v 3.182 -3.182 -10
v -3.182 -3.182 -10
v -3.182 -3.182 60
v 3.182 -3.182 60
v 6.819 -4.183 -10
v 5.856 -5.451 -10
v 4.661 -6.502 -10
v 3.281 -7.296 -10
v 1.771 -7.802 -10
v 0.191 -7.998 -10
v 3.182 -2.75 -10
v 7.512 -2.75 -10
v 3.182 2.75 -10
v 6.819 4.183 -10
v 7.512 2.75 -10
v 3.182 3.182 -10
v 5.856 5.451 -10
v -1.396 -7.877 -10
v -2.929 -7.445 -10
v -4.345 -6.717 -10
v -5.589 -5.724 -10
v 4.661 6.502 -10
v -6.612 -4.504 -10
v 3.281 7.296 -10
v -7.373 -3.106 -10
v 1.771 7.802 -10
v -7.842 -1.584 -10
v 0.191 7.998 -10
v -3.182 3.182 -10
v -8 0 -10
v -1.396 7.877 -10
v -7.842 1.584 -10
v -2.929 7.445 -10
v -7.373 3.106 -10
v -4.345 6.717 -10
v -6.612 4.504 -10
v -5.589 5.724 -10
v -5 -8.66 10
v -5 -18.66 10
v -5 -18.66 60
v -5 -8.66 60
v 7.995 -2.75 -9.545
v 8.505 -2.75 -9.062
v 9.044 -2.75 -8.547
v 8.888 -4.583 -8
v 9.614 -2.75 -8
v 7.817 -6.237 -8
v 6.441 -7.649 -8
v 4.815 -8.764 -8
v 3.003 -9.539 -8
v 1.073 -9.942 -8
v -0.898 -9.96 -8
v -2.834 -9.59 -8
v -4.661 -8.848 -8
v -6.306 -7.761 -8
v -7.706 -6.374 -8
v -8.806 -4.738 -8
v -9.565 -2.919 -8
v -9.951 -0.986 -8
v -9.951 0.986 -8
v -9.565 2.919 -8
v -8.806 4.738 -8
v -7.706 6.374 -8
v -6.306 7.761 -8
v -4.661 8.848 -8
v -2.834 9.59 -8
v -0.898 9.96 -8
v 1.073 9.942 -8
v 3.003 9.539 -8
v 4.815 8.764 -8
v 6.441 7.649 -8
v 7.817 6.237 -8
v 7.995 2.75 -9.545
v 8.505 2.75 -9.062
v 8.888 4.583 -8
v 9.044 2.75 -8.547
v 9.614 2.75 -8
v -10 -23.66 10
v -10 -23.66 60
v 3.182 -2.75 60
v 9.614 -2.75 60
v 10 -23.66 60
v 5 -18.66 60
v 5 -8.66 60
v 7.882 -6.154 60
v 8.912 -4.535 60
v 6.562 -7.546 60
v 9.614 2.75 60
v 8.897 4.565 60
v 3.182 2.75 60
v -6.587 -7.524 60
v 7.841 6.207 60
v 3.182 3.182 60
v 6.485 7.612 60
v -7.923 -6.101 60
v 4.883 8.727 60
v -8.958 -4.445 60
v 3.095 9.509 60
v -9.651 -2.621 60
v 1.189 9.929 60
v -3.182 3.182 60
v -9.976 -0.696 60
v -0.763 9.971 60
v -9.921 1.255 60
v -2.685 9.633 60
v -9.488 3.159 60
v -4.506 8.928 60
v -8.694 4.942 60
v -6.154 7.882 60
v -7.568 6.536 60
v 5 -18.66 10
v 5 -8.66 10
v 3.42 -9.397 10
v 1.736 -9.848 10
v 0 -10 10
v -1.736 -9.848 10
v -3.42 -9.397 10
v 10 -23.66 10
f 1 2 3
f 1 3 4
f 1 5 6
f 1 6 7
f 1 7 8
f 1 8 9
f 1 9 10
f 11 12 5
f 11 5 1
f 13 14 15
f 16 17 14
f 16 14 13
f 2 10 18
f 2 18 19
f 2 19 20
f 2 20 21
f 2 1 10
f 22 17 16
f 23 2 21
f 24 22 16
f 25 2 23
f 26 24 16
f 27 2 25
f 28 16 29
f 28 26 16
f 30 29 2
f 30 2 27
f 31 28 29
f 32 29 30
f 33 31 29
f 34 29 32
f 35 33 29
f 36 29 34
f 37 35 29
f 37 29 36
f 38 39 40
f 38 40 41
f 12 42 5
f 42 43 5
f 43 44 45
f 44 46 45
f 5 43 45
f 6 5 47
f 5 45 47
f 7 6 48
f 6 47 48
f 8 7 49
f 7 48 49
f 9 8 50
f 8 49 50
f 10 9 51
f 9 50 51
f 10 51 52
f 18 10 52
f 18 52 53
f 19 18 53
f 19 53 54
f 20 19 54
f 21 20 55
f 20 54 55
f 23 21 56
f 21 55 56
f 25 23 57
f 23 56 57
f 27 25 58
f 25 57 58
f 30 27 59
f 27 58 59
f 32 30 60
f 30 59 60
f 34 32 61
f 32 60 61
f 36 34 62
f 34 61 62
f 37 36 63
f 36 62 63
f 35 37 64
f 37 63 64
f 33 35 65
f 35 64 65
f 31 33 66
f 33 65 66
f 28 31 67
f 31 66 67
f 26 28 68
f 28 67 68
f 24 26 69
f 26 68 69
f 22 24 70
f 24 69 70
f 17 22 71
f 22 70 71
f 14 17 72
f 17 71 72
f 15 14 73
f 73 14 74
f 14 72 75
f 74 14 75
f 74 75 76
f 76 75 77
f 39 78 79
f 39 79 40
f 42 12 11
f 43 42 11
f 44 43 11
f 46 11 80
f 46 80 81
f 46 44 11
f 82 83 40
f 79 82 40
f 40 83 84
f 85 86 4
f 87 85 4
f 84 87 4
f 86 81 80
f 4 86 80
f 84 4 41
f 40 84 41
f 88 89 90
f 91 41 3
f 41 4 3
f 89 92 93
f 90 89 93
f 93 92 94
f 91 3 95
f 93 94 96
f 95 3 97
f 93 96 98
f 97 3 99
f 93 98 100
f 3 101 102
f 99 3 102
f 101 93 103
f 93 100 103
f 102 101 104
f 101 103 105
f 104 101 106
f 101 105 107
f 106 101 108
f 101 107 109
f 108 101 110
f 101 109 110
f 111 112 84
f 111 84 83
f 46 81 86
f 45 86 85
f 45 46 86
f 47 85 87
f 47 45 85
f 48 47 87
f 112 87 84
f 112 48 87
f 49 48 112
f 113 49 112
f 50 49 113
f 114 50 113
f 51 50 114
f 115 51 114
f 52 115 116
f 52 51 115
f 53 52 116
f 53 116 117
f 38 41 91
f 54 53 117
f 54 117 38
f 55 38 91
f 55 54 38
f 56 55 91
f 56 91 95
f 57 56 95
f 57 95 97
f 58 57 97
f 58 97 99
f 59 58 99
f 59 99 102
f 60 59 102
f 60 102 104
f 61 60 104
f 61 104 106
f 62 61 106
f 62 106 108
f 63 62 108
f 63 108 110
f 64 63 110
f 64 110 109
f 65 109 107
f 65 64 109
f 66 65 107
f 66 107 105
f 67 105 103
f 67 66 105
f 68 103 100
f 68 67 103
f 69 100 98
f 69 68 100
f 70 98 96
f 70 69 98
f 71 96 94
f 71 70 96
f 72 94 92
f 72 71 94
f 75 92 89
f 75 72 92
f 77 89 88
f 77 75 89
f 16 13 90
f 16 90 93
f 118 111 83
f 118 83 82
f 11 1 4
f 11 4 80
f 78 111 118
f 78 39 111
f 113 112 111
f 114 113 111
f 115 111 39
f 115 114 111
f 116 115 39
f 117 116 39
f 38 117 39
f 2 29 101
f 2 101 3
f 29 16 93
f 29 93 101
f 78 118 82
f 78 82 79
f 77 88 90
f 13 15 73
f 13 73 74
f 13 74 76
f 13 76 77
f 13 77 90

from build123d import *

# Parameters (mm, degrees)
BOSS_EXTRU_1_DEPTH      = 60
BOSS_EXTRU_1_DEPTH_BACK = 10
BOSS_EXTRU_2_START      = -50
BOSS_EXTRU_2_DEPTH      = 50
CHANFREIN1_SIZE         = 2


with BuildPart() as part:
    # Esquisse1 → Boss.-Extru.1 (new, two sides: drawn at the far end of the back side and taken through both)
    with BuildSketch(Plane.XY.offset(-BOSS_EXTRU_1_DEPTH_BACK)):
        with BuildLine():
            Line((3.181980515, 2.75), (3.181980515, 3.181980515))
            Line((3.181980515, 3.181980515), (-3.181980515, 3.181980515))
            Line((-3.181980515, 3.181980515), (-3.181980515, -3.181980515))
            Line((-3.181980515, -3.181980515), (3.181980515, -3.181980515))
            Line((3.181980515, -3.181980515), (3.181980515, -2.75))
            Line((3.181980515, -2.75), (9.614442262, -2.75))
            ThreePointArc((9.614442262, -2.75), (-10, 0), (9.614442262, 2.75))
            Line((9.614442262, 2.75), (3.181980515, 2.75))
        make_face()
    extrude(amount=BOSS_EXTRU_1_DEPTH + BOSS_EXTRU_1_DEPTH_BACK)

    # Esquisse3 → Boss.-Extru.2 (add)
    with BuildSketch(Plane.XY.offset(60).offset(BOSS_EXTRU_2_START)):
        with BuildLine():
            Line((5, -8.660254038), (5, -18.660254038))
            Line((5, -18.660254038), (10, -23.660254038))
            Line((10, -23.660254038), (-10, -23.660254038))
            Line((-10, -23.660254038), (-5, -18.660254038))
            Line((-5, -18.660254038), (-5, -8.660254038))
            ThreePointArc((-5, -8.660254038), (0, -10), (5, -8.660254038))
        make_face()
    extrude(amount=BOSS_EXTRU_2_DEPTH)

    # Chanfrein1
    chanfrein1_edges = [part.edges().sort_by_distance(p)[0] for p in [
        (-10, 0, -10),
    ]]
    chamfer(chanfrein1_edges, length=CHANFREIN1_SIZE)


solid = part.part
